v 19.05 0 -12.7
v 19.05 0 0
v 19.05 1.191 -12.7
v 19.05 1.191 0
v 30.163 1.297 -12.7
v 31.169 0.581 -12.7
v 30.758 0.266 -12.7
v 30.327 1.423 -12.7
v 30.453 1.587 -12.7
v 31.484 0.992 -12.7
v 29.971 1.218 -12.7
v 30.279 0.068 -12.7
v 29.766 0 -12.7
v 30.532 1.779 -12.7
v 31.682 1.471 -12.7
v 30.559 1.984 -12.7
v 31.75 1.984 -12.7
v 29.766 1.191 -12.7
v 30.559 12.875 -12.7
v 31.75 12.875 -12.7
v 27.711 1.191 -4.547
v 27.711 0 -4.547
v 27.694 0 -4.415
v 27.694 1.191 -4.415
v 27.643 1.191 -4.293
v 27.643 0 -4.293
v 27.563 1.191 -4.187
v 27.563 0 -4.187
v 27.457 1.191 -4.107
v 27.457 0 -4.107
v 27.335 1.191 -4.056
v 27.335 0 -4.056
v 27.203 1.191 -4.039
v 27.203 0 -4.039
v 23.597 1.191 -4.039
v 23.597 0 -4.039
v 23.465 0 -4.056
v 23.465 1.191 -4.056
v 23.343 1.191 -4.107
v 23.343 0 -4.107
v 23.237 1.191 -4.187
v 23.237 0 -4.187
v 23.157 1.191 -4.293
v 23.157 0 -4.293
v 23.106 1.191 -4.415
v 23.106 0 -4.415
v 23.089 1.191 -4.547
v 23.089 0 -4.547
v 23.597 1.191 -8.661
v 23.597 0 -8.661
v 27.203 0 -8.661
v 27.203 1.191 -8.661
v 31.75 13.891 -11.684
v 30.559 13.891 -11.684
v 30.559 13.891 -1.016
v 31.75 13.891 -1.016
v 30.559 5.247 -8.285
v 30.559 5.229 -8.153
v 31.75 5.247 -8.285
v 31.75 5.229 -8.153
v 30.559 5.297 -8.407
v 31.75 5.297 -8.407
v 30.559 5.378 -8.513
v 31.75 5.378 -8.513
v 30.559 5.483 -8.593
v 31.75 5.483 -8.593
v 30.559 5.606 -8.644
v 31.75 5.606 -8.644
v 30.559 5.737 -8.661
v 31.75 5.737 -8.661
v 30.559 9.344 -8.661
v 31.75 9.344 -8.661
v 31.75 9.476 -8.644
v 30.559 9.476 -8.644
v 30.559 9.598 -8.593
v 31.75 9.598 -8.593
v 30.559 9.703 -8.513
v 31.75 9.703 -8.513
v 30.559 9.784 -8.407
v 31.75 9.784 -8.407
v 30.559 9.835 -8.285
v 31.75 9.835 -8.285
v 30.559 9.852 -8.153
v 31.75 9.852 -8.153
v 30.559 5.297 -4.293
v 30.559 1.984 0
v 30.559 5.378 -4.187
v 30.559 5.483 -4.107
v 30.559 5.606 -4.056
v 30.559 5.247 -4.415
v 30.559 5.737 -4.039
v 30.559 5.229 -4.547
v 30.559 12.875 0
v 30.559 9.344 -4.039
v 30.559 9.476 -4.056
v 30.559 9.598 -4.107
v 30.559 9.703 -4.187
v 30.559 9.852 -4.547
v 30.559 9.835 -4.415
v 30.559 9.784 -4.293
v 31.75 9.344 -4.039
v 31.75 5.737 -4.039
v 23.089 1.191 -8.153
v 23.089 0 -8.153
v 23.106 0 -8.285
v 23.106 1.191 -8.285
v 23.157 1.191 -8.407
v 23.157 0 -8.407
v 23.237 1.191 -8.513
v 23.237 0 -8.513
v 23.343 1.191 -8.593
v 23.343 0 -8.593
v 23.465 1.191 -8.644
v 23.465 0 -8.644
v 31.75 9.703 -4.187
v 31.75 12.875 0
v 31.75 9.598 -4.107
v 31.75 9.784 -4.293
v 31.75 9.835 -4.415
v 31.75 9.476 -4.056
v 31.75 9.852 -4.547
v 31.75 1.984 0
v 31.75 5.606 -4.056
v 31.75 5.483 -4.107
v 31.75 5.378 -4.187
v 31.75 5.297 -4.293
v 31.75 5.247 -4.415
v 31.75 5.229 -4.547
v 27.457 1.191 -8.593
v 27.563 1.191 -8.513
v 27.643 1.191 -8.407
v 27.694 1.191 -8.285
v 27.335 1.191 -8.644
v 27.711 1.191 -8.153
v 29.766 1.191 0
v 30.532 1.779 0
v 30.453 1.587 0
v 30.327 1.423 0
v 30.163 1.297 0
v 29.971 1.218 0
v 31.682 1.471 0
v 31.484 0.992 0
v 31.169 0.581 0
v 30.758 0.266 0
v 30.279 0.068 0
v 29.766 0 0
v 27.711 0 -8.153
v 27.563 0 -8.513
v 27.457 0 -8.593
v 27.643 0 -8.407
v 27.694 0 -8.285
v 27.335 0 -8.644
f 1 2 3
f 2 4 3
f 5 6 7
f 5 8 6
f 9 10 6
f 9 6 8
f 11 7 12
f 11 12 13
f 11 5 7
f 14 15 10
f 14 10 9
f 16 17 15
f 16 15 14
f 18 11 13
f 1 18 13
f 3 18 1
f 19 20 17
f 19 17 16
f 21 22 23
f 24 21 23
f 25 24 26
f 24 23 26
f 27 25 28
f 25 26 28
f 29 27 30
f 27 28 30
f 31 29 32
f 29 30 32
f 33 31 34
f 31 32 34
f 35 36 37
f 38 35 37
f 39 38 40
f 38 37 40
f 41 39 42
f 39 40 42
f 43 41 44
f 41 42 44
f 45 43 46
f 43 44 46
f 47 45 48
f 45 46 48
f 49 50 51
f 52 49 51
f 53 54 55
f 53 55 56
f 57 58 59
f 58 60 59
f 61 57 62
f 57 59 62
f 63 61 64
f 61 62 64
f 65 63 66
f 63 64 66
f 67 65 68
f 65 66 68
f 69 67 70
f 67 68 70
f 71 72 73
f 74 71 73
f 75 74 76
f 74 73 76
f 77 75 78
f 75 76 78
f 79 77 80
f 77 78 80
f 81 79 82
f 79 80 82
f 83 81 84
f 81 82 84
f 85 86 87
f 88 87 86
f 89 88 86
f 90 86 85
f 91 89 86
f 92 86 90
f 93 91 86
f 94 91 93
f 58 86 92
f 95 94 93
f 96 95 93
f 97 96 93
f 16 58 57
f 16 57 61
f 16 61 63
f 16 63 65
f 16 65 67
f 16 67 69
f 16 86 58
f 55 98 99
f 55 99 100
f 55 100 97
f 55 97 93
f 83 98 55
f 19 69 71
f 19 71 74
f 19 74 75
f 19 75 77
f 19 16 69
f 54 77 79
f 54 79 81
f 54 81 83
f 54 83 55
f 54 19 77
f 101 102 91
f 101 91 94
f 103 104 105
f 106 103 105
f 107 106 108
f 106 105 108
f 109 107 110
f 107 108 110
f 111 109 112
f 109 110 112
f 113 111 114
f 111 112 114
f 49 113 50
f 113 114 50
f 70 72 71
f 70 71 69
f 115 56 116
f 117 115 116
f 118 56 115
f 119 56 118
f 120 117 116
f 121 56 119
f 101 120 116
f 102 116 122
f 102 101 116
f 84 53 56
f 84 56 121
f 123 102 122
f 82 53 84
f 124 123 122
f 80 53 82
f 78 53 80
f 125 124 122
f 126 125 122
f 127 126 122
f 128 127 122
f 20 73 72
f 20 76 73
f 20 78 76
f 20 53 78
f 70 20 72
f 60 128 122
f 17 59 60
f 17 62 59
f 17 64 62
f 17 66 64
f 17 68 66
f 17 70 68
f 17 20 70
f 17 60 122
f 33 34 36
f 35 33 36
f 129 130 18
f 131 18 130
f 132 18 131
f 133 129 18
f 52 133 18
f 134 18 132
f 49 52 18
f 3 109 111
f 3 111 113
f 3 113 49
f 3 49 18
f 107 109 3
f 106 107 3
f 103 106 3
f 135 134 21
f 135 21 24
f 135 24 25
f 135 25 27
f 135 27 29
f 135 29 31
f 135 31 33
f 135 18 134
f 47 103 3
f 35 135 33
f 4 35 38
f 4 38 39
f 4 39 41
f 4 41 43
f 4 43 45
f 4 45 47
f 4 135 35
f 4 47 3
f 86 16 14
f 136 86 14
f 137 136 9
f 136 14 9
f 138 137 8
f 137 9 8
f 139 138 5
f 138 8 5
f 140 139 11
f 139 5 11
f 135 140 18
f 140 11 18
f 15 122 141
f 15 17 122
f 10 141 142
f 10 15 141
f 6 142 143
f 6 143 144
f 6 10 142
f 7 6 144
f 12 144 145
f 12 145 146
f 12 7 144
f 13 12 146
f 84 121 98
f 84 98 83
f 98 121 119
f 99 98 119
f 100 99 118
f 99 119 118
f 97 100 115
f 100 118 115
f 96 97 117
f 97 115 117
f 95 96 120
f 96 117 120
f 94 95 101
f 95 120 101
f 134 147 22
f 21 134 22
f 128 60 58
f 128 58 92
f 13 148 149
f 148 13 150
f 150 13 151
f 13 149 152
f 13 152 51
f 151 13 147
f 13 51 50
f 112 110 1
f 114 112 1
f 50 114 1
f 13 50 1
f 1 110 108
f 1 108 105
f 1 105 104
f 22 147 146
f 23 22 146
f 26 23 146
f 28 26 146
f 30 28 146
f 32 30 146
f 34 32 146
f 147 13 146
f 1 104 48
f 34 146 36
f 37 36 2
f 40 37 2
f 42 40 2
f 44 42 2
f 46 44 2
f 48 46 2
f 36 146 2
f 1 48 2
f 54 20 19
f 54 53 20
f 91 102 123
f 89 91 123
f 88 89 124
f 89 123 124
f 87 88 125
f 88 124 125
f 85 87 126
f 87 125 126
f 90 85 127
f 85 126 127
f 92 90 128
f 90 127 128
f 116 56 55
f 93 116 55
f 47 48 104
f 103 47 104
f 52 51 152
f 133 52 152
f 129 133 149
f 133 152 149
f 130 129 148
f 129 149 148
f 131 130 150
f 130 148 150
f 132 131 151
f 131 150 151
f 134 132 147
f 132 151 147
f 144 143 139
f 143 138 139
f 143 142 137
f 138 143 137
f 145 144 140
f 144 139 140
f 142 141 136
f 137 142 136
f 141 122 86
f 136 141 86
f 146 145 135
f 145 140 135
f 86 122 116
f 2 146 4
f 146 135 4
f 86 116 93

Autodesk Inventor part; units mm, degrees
ref_plane "YZ Plane" through (0, 0, 0) normal (1, 0, 0) x (0, 1, 0)
ref_plane "XZ Plane" through (0, 0, 0) normal (0, 1, 0) x (-1, 0, 0)
sketch "Sketch1" plane through (0, 0, 0) normal (0, 1, 0) x (-1, 0, 0)
  line L0 (-31.75, 0) -> (31.75, 0)
  line L1 (31.75, 0) -> (31.75, -12.7)
  line L2 (31.75, -12.7) -> (-31.75, -12.7)
  line L3 (-31.75, -12.7) -> (-31.75, 0)
  line L4 (31.75, 0) -> (-31.75, -12.7) construction
  point P0 (0, 0)
  point P1 (0, 0)
  dimension "d0" = 63.5
  dimension "d1" = 12.7
extrude "Plate1" add sketch "Sketch1" along normal blind 1.1906
sketch "Sketch2" plane through (30.5594, 0, -12.7) normal (1, 0, 0) x (0, 1, 0)
  line L0 (0, 12.7) -> (0, 0)
  line L1 (0, 0) -> (13.8906, 0)
  line L2 (13.8906, 0) -> (13.8906, 12.7)
  line L3 (13.8906, 12.7) -> (0, 12.7)
edge flange "Flanges" height 12.7 angle 90 thickness 1.1906 bend radius 0.7937 thickness toward (1, 0, 0) relief tear relief width 1.1906 relief depth 0.5953 corner gap 1.1906 corner form 0 edges at (31.75, 1.1906, -6.35) (-31.75, 1.1906, -6.35) wall of the first edge with corners at (30.5594, 0, 0) (30.5594, 0, -12.7) (30.5594, 13.8906, -12.7) (30.5594, 13.8906, 0)
bend "Bend1"
corner "Corner1"
sketch "Sketch3" plane through (31.75, 1.9844, -12.7) normal (1, 0, 0) x (0, 0, -1)
  line L0 (-8.1534, 7.8677) -> (-4.5466, 7.8677)
  line L1 (-4.0386, 7.3597) -> (-4.0386, 3.7529)
  line L2 (-4.5466, 3.2449) -> (-8.1534, 3.2449)
  line L3 (-8.6614, 3.7529) -> (-8.6614, 7.3597)
  arc A0 (-8.1534, 7.8677) -> (-8.6614, 7.3597) centre (-8.1534, 7.3597) ccw
  arc A1 (-4.0386, 7.3597) -> (-4.5466, 7.8677) centre (-4.5466, 7.3597) ccw
  arc A2 (-4.5466, 3.2449) -> (-4.0386, 3.7529) centre (-4.5466, 3.7529) ccw
  arc A3 (-8.6614, 3.7529) -> (-8.1534, 3.2449) centre (-8.1534, 3.7529) ccw
  line L4 (-12.7, 0) -> (-12.7, 11.9063) construction
  line L5 (-12.7, 11.9063) -> (0, 11.9063) construction
  line L6 (-8.1534, 7.3597) -> (-4.5466, 3.7529) construction
  point P0 (-12.7, -1.9844)
  point P1 (-4.0386, 3.2449)
  point P2 (-8.6614, 3.2449)
  point P3 (-6.35, 5.5563)
  dimension "d16" = 4.6228
  dimension "d17" = 0.508
  dimension "d20" = 6.35
  dimension "d21" = 6.35
extrude "Flange Stamp" cut sketch "Sketch3" against normal blind 1.1906
sketch "Sketch7" plane through (31.75, 1.9844, 0) normal (1, 0, 0) x (0, 0, -1)
  arc A0 (4.5466, 7.8677) -> (4.0386, 7.3597) centre (4.5466, 7.3597) ccw construction
  arc A1 (8.1534, 3.2449) -> (8.6614, 3.7529) centre (8.1534, 3.7529) ccw construction
  circle A2 centre (6.35, 5.5563) radius 2.1844
  line L0 (4.5466, 7.3597) -> (8.1534, 3.7529) construction
  point P0 (0, -1.9844)
  dimension "d46" = 4.3688
surface extrude "Flange Circle" sketch "Sketch7" against normal up to surface (1.1906 mm away) shown yes curves A2
ref_plane "Flange Pattern Plane" through (31.75, 7.5406, -4.5466) normal (0, 1, 0) x (1, 0, 0)
feature "Flange Pattern" [suppressed]
sketch "Sketch8" plane through (0, 0, 0) normal (0, -1, 0) x (1, 0, 0)
  line L0 (29.7656, 0) -> (-29.7656, 0) construction
  line L1 (27.2034, -4.0386) -> (23.5966, -4.0386)
  line L2 (23.0886, -4.5466) -> (23.0886, -8.1534)
  line L3 (23.5966, -8.6614) -> (27.2034, -8.6614)
  line L4 (27.7114, -8.1534) -> (27.7114, -4.5466)
  arc A0 (27.7114, -4.5466) -> (27.2034, -4.0386) centre (27.2034, -4.5466) ccw
  arc A1 (27.2034, -8.6614) -> (27.7114, -8.1534) centre (27.2034, -8.1534) ccw
  arc A2 (23.0886, -8.1534) -> (23.5966, -8.6614) centre (23.5966, -8.1534) ccw
  arc A3 (23.5966, -4.0386) -> (23.0886, -4.5466) centre (23.5966, -4.5466) ccw
  line L5 (27.2034, -4.5466) -> (23.5966, -8.1534) construction
  line L6 (31.75, 0) -> (31.75, -12.7) construction
  point P0 (0, 0)
  point P1 (23.0886, -8.6614)
  point P2 (27.7114, -8.6614)
  point P3 (25.4, -6.35)
  dimension "d49" = 4.6228
  dimension "d50" = 0.508
  dimension "d51" = 6.35
  dimension "d52" = 6.35
extrude "Body Stamp" cut sketch "Sketch8" against normal blind 1.1906
sketch "Sketch9" plane through (0, 0, 0) normal (0, -1, 0) x (1, 0, 0)
  arc A0 (27.7114, -4.5466) -> (27.2034, -4.0386) centre (27.2034, -4.5466) ccw construction
  arc A1 (23.0886, -8.1534) -> (23.5966, -8.6614) centre (23.5966, -8.1534) ccw construction
  line L0 (27.2034, -4.5466) -> (23.5966, -8.1534) construction
  circle A2 centre (25.4, -6.35) radius 2.1844
  point P0 (0, 0)
  dimension "d55" = 4.3688
surface extrude "Body Circle" sketch "Sketch9" against normal up to surface (1.1906 mm away) shown yes curves A2
feature "Body Pattern" [suppressed]
sketch "Arc Length" plane through (30.5594, 1.9844, 0) normal (0, 0, 1) x (1, 0, 0)
  line L0 (0, 0) -> (1.1906, 0) construction
  arc A0 (-0.7938, -0.7938) -> (0, 0) centre (-0.7938, 0) ccw construction
  line L1 (-0.7938, -1.9844) -> (-0.7938, -0.7938) construction
  arc A1 (-0.7938, -1.9844) -> (1.1906, 0) centre (-0.7938, 0) ccw construction
  point P0 (-30.5594, -1.9844)
  dimension "d85" = 3.117
  dimension "d92" = 1.2468
sketch "Sketch13" plane through (31.75, 13.8906, 0) normal (1, 0, 0) x (0, 0, -1)
  line L0 (0, 0) -> (12.7, 0) construction
  line L1 (62.4078, 0) -> (63.4238, -1.016)
  line L2 (63.4238, -1.016) -> (64.4398, 0)
  line L3 (62.4078, 0) -> (64.4398, 0)
  line L4 (12.7, -11.9063) -> (0, -11.9063) construction
  line L5 (63.4238, -10.8903) -> (61.3168, -12.9972)
  line L6 (61.3168, -12.9972) -> (63.4238, -15.1042)
  line L7 (63.4238, -15.1042) -> (65.5308, -12.9972)
  line L8 (65.5308, -12.9972) -> (63.4238, -10.8903)
  line L9 (63.4238, -10.8903) -> (63.4238, -15.1042) construction
  line L10 (63.4238, -1.016) -> (63.4238, -10.8903) construction
  line L11 (0, -11.9063) -> (12.7, -11.9063) construction
  point P0 (0, -13.8906)
  dimension "d86" = 4.2139
  dimension "d88" = 1.016
  dimension "d91" = 1.016
  dimension "d102" = 63.4238
feature "Notch" [suppressed]
mirror "Notch Mirror" [suppressed]
pattern_linear "Notch Pattern" [suppressed]
chamfer "End Chamfer" distance 1.016 angle 45 4 edges at (-31.1547, 13.8906, -12.7) (31.1547, 13.8906, -12.7) (-31.1547, 13.8906, 0) (31.1547, 13.8906, 0)
sketch "Sketch14" plane through (-31.75, 1.9844, 431.8) normal (1, 0, 0) x (0, 0, -1)
  line L0 (431.8, 11.9063) -> (444.5, 11.9063) construction
  line L1 (431.8, 0) -> (431.8, 11.9063) construction
  line L2 (431.8, -1.9844) -> (444.5, -1.9844) construction
  line L3 (431.8, 11.9063) -> (444.5, 11.9063)
  line L4 (444.5, 11.9063) -> (444.5, -1.9844)
  line L5 (444.5, -1.9844) -> (431.8, -1.9844)
  line L6 (431.8, -1.9844) -> (431.8, 11.9063)
  point P0 (382.0521, -1.9844)
extrude "Half Cut" cut sketch "Sketch14" along normal blind 50.8
sketch "Flange Pattern Sketch" plane through (31.75, 7.5406, -4.5466) normal (0, 1, 0) x (1, 0, 0)
  line L0 (0, 3.6068) -> (0, 0) construction
  line L1 (-76.2822, -4.5466) -> (13.1932, -4.5466) construction
  line L2 (0, 0) -> (-1.1906, 0) construction
  point P0 (-31.75, -4.5466)
  point P1 (0, 1.8034)
  point P2 (0, 14.5034)
  point P3 (0, 27.2034)
  point P4 (0, 39.9034)
  point P5 (0, 52.6034)
  point P6 (0, 65.3034)
  point P7 (0, 78.0034)
  point P8 (0, 90.7034)
  point P9 (0, 103.4034)
  point P10 (0, 116.1034)
  point P11 (0, 128.8034)
  point P12 (0, 141.5034)
  point P13 (0, 154.2034)
  point P14 (0, 166.9034)
  point P15 (0, 179.6034)
  point P16 (0, 192.3034)
  point P17 (0, 205.0034)
  point P18 (0, 217.7034)
  point P19 (0, 230.4034)
  point P20 (0, 243.1034)
  point P21 (0, 255.8034)
  point P22 (0, 268.5034)
  point P23 (0, 281.2034)
  point P24 (0, 293.9034)
  point P25 (0, 306.6034)
  point P26 (0, 319.3034)
  point P27 (0, 332.0034)
  point P28 (0, 344.7034)
  point P29 (0, 357.4034)
  point P30 (0, 370.1034)
  point P31 (0, 382.8034)
  point P32 (0, 395.5034)
  point P33 (0, 408.2034)
  point P34 (0, 420.9034)
  point P35 (0, 433.6034)
  dimension "d131" = 12.7
  dimension "d134" = 12.7
sketch "Body Pattern Sketch" plane through (0, 0, 0) normal (0, -1, 0) x (1, 0, 0)
  line L0 (29.7656, 0) -> (-29.7656, 0) construction
  line L1 (31.75, 0) -> (31.75, -12.7) construction
  circle A0 centre (25.4, -6.35) radius 2.1844 construction
  point P0 (0, 0)
  point P1 (25.4, -19.05)
  point P2 (25.4, -31.75)
  point P3 (25.4, -44.45)
  point P4 (25.4, -57.15)
  point P5 (25.4, -69.85)
  point P6 (25.4, -82.55)
  point P7 (25.4, -95.25)
  point P8 (25.4, -107.95)
  point P9 (25.4, -120.65)
  point P10 (25.4, -133.35)
  point P11 (25.4, -146.05)
  point P12 (25.4, -158.75)
  point P13 (25.4, -171.45)
  point P14 (25.4, -184.15)
  point P15 (25.4, -196.85)
  point P16 (25.4, -209.55)
  point P17 (25.4, -222.25)
  point P18 (25.4, -234.95)
  point P19 (25.4, -247.65)
  point P20 (25.4, -260.35)
  point P21 (25.4, -273.05)
  point P22 (25.4, -285.75)
  point P23 (25.4, -298.45)
  point P24 (25.4, -311.15)
  point P25 (25.4, -323.85)
  point P26 (25.4, -336.55)
  point P27 (25.4, -349.25)
  point P28 (25.4, -361.95)
  point P29 (25.4, -374.65)
  point P30 (25.4, -387.35)
  point P31 (25.4, -400.05)
  point P32 (25.4, -412.75)
  point P33 (25.4, -425.45)
  point P34 (25.4, -438.15)
  dimension "d62" = 12.7
  dimension "d65" = 12.7
  dimension "d139" = 12.7
equation "\"d1\" = 12.7 * Length"
equation "\"d18\" = Thickness"
equation "\"d53\" = Thickness"
equation "\"d89\" = Thickness"
equation "\"d2\" = Thickness"
equation "\"d3\" = BendReliefWidth"
equation "\"d4\" = BendReliefDepth"
equation "\"d5\" = MinimumRemnant"
equation "\"d6\" = TransitionRadius"
equation "\"d10\" = CornerReliefSize"
equation "\"d11\" = GapSize"
equation "\"d12\" = JacobiRadiusSize"
equation "\"BendRadius\" = Thickness"
equation "\"BendReliefWidth\" = Thickness"
equation "\"BendReliefDepth\" = 0.5 * Thickness"
equation "\"CornerReliefSize\" = 4 * Thickness"
equation "\"MinimumRemnant\" = 2 * Thickness"
equation "\"TransitionRadius\" = BendRadius"
equation "\"JacobiRadiusSize\" = BendRadius"
equation "\"GapSize\" = Thickness"
equation "\"Length\" = 1"
equation "\"Thickness\" = 1.190625"
properties part number "Alu C 1x3x1x35"
